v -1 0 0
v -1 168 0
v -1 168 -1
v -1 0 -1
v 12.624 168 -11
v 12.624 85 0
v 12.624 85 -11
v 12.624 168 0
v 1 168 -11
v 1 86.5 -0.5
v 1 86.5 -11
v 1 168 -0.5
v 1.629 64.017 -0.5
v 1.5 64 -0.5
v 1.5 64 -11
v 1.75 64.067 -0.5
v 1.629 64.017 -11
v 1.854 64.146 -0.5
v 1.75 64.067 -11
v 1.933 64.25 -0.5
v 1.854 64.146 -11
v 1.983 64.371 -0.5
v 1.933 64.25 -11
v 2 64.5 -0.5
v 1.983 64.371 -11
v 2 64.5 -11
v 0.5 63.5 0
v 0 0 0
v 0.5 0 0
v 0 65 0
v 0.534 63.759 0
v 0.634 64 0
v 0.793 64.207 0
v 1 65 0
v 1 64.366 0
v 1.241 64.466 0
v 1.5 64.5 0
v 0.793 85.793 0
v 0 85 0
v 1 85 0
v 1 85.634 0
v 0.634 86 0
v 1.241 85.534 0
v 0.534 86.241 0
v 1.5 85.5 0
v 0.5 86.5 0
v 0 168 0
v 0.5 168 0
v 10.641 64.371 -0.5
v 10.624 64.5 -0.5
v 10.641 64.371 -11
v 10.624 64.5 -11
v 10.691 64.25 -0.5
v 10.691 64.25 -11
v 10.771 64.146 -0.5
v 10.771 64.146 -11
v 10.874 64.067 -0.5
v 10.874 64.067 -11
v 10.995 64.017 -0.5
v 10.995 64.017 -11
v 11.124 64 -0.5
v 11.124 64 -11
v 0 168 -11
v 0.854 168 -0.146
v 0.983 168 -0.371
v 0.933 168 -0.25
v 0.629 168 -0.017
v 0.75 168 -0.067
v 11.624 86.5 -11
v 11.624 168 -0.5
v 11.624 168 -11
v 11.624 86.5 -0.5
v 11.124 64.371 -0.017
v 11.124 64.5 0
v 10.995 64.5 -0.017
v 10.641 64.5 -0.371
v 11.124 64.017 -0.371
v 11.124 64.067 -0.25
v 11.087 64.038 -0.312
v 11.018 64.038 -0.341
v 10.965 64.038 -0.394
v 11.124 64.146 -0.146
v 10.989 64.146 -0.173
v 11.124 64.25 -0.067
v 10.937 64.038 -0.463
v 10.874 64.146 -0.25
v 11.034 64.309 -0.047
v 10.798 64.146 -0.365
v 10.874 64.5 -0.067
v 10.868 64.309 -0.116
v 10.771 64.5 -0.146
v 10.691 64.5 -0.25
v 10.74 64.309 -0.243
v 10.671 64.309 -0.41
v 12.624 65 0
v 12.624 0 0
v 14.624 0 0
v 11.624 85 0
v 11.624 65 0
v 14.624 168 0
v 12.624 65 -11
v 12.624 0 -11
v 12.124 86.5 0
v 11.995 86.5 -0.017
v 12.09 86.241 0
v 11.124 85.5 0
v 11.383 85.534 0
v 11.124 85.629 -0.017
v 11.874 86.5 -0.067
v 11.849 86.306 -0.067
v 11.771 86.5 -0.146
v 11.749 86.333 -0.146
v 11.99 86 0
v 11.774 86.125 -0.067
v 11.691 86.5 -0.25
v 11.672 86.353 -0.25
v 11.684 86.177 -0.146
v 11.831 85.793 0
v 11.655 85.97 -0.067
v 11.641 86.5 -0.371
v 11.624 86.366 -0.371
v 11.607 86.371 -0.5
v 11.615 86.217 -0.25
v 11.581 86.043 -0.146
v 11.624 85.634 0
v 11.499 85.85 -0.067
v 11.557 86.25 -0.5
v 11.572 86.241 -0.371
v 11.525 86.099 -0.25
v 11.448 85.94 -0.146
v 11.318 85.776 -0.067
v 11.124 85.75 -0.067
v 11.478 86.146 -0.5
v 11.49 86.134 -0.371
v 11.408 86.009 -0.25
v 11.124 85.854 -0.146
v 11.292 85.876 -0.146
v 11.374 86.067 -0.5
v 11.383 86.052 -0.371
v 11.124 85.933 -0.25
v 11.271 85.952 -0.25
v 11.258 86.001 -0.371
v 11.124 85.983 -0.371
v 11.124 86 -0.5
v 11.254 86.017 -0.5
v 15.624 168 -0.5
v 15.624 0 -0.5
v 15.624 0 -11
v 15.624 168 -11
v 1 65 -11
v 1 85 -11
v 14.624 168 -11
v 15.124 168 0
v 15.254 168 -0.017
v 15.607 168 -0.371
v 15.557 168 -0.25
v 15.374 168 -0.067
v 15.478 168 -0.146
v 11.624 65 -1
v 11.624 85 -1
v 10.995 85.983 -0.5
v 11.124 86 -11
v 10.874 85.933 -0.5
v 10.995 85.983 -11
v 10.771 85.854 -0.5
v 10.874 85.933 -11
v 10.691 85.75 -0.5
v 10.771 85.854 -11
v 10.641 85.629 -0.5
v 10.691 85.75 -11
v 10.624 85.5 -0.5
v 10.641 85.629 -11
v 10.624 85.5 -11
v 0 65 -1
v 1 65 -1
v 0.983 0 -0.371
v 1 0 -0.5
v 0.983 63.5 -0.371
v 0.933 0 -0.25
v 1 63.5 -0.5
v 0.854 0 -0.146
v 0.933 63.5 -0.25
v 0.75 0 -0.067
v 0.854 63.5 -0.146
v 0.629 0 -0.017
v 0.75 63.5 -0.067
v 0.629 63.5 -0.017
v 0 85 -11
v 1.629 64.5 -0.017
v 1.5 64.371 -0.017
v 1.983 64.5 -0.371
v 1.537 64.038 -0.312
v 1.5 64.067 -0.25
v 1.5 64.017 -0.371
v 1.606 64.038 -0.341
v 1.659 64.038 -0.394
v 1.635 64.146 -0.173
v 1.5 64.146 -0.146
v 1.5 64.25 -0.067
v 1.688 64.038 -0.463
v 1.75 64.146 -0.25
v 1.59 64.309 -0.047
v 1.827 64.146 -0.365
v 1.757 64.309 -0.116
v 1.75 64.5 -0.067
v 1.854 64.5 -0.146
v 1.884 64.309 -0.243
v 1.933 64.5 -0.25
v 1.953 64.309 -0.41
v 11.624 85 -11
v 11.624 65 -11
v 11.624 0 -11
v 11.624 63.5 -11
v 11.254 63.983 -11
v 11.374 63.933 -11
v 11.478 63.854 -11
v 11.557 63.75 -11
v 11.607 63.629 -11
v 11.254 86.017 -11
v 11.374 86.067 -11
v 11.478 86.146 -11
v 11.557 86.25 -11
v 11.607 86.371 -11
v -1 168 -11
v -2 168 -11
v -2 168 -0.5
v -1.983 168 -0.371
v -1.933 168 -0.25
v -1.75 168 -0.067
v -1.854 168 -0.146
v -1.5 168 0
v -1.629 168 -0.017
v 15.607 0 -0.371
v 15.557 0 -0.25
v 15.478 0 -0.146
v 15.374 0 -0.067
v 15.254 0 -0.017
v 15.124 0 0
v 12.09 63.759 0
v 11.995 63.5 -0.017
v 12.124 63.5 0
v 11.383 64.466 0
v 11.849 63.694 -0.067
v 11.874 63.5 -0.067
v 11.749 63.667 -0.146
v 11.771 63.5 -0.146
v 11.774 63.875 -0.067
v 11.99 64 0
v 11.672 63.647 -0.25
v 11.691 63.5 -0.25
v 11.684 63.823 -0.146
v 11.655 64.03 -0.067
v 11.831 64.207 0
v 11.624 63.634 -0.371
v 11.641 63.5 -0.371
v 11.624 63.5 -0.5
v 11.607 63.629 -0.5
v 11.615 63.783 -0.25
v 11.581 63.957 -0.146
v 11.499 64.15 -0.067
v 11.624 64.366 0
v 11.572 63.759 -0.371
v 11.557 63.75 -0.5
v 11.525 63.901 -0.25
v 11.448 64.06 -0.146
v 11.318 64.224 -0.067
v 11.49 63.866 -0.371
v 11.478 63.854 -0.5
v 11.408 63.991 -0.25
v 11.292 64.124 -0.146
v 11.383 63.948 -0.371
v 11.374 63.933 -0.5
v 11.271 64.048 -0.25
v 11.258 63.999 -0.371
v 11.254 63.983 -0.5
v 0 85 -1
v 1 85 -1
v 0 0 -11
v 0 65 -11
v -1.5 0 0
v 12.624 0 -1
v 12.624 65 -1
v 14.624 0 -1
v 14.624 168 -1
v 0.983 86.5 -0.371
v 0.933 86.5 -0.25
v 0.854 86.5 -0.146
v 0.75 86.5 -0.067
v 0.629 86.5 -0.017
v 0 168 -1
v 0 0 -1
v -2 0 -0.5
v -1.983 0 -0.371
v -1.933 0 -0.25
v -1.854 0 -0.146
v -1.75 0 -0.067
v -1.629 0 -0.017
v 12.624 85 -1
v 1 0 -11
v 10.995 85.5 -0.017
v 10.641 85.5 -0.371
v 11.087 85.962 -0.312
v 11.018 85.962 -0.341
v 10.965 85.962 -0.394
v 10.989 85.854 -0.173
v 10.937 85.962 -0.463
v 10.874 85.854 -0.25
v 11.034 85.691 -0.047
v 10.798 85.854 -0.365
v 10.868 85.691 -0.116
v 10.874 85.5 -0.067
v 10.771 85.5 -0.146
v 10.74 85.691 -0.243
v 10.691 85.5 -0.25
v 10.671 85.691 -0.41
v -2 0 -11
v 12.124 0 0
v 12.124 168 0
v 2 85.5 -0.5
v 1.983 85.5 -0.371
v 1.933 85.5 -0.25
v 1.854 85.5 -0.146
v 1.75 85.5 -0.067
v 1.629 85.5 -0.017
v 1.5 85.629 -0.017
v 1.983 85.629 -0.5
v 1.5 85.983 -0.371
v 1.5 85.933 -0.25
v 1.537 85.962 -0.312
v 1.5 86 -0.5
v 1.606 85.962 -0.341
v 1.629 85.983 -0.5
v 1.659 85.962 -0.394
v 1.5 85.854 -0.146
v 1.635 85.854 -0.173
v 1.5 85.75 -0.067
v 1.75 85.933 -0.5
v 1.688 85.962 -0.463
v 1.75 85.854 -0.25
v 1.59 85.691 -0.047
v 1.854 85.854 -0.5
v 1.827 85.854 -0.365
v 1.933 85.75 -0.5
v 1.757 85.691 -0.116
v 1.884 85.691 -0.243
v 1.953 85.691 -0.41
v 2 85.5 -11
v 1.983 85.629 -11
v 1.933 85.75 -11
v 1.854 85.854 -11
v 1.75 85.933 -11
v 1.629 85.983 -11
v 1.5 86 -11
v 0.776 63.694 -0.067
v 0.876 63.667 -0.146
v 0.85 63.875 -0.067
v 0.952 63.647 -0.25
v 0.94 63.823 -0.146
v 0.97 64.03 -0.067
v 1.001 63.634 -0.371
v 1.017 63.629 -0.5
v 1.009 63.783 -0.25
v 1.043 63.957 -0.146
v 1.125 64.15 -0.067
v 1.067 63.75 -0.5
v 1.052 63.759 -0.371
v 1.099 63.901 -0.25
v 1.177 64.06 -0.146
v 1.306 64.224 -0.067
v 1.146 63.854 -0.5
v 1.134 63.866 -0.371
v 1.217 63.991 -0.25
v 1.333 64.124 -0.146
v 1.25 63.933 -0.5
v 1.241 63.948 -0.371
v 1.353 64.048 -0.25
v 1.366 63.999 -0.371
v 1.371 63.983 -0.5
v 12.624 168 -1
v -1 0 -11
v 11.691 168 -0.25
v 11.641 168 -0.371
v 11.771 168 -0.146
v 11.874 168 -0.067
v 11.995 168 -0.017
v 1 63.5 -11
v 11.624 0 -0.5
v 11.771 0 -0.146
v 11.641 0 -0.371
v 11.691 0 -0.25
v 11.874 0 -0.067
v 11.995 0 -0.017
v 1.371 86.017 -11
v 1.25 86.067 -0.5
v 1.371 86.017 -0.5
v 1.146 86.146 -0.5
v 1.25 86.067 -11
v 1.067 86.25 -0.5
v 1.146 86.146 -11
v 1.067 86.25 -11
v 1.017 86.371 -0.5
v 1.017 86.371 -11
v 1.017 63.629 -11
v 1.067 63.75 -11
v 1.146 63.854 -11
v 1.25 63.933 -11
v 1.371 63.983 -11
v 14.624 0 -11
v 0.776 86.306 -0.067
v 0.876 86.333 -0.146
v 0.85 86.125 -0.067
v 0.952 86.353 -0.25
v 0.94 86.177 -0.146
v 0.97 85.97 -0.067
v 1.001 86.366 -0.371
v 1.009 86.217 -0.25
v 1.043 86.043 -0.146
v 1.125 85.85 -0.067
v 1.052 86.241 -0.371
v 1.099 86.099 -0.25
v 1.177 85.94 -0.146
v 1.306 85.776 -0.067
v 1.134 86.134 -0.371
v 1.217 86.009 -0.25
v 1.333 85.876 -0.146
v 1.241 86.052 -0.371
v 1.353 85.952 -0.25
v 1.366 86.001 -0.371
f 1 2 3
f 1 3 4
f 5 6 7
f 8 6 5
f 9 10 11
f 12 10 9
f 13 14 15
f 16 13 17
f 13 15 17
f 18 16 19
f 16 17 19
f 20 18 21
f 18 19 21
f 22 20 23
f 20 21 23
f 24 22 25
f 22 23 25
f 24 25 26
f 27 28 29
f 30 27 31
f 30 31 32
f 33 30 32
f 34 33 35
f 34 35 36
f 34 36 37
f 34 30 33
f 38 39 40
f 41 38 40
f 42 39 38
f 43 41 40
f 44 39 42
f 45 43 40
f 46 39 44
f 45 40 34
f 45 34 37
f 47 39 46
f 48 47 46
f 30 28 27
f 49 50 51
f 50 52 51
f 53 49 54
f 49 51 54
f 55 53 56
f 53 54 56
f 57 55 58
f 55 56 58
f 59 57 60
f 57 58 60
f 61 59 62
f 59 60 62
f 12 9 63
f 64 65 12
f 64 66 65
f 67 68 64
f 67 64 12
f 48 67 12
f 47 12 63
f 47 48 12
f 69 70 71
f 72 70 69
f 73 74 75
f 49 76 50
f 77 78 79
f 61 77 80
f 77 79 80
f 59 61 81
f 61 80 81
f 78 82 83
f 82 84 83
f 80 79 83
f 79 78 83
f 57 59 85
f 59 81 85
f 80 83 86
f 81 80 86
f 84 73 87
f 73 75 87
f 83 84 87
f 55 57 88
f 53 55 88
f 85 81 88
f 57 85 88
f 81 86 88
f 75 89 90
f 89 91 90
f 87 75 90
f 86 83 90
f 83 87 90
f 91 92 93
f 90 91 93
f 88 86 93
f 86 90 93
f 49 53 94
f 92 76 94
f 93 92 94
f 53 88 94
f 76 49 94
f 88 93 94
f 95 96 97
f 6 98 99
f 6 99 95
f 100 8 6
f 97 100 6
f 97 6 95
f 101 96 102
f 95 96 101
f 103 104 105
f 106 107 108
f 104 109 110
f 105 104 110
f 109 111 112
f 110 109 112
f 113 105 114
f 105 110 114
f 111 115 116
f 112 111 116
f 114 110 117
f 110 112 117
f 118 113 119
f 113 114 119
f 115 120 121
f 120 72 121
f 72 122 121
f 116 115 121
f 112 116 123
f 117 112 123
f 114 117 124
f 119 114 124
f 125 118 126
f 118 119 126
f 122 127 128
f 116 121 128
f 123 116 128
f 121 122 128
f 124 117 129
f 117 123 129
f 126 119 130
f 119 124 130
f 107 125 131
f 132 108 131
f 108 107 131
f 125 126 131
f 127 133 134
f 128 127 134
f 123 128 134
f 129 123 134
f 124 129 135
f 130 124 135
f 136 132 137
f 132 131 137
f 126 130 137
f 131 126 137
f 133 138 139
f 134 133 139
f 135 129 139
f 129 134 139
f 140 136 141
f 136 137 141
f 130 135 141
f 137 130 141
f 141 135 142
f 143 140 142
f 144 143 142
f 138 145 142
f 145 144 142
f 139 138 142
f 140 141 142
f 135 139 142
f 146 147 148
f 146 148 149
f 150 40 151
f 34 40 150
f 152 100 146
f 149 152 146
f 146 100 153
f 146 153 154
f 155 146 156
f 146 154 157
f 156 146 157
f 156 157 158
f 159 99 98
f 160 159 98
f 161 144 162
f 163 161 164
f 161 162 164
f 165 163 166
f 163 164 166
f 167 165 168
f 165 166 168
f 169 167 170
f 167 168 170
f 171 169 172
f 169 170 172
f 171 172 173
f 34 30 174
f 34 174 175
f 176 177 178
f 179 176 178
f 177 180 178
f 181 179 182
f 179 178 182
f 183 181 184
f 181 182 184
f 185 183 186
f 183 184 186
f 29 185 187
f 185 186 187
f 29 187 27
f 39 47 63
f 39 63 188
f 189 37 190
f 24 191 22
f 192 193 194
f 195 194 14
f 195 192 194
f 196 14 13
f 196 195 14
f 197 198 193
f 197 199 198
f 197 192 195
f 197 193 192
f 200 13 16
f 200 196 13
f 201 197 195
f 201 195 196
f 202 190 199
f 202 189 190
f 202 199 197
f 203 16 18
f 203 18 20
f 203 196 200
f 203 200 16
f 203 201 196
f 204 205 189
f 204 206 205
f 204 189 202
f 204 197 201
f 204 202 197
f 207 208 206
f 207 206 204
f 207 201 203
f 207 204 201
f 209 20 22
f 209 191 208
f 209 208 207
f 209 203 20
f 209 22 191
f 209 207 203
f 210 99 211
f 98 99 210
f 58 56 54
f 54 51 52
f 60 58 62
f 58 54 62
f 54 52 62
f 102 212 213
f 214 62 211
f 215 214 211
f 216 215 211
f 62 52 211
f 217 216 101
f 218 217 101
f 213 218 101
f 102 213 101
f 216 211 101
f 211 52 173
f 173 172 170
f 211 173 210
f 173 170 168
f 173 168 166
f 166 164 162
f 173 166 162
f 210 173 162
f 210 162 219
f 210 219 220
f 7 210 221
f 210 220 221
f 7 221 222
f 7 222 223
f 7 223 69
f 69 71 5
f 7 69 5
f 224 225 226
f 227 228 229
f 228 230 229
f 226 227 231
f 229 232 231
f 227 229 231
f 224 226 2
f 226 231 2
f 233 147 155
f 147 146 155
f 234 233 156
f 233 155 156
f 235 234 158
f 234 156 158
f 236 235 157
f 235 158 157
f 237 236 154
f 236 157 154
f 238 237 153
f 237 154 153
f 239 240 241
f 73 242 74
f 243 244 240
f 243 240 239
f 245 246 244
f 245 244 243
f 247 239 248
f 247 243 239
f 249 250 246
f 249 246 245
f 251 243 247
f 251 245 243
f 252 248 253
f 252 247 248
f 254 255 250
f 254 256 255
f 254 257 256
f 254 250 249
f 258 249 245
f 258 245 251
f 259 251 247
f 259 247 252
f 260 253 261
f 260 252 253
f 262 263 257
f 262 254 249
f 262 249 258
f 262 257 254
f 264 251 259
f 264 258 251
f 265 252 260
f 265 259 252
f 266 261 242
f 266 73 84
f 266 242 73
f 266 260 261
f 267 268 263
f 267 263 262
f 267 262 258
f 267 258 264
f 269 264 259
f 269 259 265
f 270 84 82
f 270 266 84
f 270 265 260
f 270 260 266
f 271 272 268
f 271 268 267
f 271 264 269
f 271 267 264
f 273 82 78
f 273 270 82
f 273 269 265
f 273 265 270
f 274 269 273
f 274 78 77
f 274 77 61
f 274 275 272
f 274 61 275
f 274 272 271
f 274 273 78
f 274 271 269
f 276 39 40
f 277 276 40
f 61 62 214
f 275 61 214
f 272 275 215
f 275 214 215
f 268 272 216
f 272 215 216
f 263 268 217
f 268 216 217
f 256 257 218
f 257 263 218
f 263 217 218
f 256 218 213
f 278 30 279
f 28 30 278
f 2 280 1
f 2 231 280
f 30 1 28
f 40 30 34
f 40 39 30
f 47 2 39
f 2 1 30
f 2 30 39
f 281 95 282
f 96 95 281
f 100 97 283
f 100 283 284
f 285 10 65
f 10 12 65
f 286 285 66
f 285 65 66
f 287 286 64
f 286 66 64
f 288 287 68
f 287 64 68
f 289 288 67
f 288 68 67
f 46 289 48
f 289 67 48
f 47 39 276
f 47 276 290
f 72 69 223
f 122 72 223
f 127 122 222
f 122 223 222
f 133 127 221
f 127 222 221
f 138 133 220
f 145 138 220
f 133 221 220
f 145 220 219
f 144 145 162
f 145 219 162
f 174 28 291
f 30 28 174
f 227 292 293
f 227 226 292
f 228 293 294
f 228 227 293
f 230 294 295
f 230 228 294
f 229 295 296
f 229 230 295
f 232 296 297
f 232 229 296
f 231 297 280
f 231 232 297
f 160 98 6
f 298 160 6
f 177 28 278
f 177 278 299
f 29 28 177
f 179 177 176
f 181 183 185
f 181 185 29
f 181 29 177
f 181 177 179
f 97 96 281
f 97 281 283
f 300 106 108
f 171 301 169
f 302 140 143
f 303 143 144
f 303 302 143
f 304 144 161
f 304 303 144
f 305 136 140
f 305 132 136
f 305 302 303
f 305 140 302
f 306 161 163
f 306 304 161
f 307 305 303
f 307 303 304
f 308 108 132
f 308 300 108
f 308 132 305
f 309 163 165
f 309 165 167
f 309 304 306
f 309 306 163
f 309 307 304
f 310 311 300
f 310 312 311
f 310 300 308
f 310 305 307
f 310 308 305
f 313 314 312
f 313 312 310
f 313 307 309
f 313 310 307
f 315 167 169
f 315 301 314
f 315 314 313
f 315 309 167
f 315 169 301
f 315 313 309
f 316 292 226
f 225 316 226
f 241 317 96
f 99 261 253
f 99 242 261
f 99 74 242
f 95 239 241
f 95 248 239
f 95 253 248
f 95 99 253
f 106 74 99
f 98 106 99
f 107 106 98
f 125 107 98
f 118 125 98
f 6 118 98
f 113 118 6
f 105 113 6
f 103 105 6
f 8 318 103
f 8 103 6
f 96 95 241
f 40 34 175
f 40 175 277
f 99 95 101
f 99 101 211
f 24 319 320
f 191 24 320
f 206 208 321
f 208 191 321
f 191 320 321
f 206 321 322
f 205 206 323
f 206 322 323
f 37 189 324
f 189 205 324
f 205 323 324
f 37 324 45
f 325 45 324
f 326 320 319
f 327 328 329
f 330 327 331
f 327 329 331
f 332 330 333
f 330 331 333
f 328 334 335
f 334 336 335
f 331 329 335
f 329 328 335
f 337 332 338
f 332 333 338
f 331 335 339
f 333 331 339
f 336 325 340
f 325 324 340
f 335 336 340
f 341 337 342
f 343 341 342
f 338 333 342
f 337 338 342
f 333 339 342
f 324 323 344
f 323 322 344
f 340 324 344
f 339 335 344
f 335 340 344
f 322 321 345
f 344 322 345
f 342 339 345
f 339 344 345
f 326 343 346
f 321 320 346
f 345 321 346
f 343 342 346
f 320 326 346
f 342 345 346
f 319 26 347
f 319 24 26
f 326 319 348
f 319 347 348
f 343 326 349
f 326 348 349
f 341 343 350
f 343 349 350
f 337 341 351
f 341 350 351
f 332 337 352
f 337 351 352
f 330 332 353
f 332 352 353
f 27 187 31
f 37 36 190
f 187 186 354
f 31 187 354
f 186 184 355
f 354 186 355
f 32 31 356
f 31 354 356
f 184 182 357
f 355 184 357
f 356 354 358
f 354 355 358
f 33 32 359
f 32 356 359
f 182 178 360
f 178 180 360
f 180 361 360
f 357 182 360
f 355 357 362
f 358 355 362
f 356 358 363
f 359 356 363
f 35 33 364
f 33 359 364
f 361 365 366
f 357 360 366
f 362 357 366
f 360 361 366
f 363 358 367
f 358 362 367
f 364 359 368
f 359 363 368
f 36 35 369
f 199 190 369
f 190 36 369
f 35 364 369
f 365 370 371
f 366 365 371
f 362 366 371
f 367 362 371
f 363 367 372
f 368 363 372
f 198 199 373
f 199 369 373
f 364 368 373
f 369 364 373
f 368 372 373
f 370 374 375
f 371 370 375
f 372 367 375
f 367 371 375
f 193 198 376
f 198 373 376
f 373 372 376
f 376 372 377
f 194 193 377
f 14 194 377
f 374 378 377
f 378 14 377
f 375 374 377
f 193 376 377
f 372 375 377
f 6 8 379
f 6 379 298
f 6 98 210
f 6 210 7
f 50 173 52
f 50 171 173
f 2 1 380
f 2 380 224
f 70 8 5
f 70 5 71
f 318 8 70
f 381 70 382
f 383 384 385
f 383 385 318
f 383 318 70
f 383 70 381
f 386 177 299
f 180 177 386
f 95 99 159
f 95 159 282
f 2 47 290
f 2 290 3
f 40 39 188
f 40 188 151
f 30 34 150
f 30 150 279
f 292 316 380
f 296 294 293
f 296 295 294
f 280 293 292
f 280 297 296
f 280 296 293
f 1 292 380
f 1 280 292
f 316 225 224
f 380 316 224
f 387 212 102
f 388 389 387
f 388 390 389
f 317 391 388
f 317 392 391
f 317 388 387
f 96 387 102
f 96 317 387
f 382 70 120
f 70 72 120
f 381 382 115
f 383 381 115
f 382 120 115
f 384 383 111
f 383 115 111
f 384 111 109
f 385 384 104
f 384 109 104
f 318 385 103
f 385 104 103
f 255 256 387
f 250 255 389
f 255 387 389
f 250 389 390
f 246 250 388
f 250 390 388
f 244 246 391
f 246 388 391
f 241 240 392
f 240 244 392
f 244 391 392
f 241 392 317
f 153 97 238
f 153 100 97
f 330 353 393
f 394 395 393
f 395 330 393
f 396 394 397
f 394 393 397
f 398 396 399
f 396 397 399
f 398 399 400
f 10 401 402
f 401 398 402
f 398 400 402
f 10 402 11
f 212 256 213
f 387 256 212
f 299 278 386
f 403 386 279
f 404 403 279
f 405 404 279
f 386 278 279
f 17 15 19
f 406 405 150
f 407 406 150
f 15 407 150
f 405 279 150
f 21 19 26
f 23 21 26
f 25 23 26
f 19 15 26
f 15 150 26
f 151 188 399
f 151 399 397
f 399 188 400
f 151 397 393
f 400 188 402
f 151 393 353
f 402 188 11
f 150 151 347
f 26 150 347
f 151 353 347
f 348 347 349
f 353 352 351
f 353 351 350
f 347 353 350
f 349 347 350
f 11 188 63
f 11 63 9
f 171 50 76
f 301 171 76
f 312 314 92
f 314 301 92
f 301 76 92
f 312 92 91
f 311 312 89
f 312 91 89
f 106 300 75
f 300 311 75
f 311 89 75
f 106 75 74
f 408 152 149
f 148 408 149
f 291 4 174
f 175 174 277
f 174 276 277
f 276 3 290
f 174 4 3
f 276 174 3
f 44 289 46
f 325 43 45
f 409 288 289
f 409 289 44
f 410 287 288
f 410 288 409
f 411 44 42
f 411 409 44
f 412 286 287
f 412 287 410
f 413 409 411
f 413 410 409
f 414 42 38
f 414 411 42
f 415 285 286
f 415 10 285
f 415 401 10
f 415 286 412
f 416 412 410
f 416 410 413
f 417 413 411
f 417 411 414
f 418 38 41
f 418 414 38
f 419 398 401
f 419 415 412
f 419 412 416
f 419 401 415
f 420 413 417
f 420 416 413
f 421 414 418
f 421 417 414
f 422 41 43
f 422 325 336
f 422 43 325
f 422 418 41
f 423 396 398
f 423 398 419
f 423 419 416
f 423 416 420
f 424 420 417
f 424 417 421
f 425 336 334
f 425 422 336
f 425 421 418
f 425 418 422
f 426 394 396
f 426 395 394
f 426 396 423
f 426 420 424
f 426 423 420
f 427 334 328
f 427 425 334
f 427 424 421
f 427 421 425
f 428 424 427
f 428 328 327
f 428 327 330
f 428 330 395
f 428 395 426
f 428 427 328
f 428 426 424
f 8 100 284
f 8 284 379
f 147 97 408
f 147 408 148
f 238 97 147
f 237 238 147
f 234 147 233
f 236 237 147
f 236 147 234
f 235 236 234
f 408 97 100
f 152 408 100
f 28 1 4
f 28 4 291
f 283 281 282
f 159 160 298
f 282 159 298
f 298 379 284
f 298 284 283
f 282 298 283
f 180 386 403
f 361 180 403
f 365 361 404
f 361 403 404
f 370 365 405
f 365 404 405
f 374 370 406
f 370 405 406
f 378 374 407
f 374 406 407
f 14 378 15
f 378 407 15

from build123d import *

# Parameters (mm, degrees)
F0_W     = 1
F0_H     = 20
F1_DEPTH = 1
F0_H_2   = 168
F2_DEPTH = 11
F3_R     = 0.49999
F3_2_R   = 0.49999
F3_3_R   = 0.49999
F3_4_R   = 0.49999


# Not quite as in the source:
# - a fillet or chamfer is up to 0.001 mm smaller than in the source, because OpenCascade refuses the exact size


with BuildPart() as f1:
    # F0 (on Top) → F1 (new body)
    with BuildSketch(Plane.XY):
        Polygon((-1, 0), (0, 0), (0, 65), (0, 85), (0, 168), (-1, 168), align=None)
        with Locations((0.5, 75)):
            Rectangle(F0_W, F0_H)
    extrude(amount=-F1_DEPTH)


with BuildPart() as f1b:
    # F0 (on Top) → F1, piece 2 (new body)
    with BuildSketch(Plane.XY):
        Polygon((12.6243081391, 65), (12.6243081391, 0), (14.6243081391, 0), (14.6243081391, 168), (12.6243081391, 168), (12.6243081391, 85), align=None)
        with Locations((12.1243081391, 75)):
            Rectangle(F0_W, F0_H)
    extrude(amount=-F1_DEPTH)


with BuildPart() as f2:
    # F0 (on Top) → F2 (new body)
    with BuildSketch(Plane.XY):
        with Locations((-1.5, 84)):
            Rectangle(F0_W, F0_H_2)
    extrude(amount=-F2_DEPTH)

    # F3#4 (radius 0.5 in the source; OpenCascade refuses exactly that, so slightly less here)
    f3_4_edges = [f2.edges().sort_by_distance(p)[0] for p in [
        (-2, 84, 0),
    ]]
    fillet(f3_4_edges, radius=F3_4_R)


with BuildPart() as f2b:
    # F0 (on Top) → F2, piece 2 (new body)
    with BuildSketch(Plane.XY):
        Polygon((0, 168), (0, 85), (1, 85), (1, 86), (1, 168), align=None)
        Polygon((1, 85), (1, 65), (1, 64), (2, 64), (2, 86), (1, 86), align=None)
        Polygon((0, 65), (0, 0), (1, 0), (1, 64), (1, 65), align=None)
    extrude(amount=-F2_DEPTH)

    # F3#3 (radius 0.5 in the source; OpenCascade refuses exactly that, so slightly less here)
    f3_3_edges = [f2b.edges().sort_by_distance(p)[0] for p in [
        (1, 32, 0),
        (2, 75, 0),
        (1, 127, 0),
        (1.5, 86, 0),
        (1.5, 64, 0),
        (2, 64, -5.5),
        (2, 86, -5.5),
        (1, 86, -5.5),
        (1, 64, -5.5),
    ]]
    fillet(f3_3_edges, radius=F3_3_R)


with BuildPart() as f2c:
    # F0 (on Top) → F2, piece 3 (new body)
    with BuildSketch(Plane.XY):
        Polygon((11.6243081391, 64), (11.6243081391, 65), (11.6243081391, 85), (11.6243081391, 86), (10.6243081391, 86), (10.6243081391, 64), align=None)
        Polygon((11.6243081391, 0), (12.6243081391, 0), (12.6243081391, 65), (11.6243081391, 65), (11.6243081391, 64), align=None)
        Polygon((11.6243081391, 85), (12.6243081391, 85), (12.6243081391, 168), (11.6243081391, 168), (11.6243081391, 86), align=None)
    extrude(amount=-F2_DEPTH)

    # F3#2 (radius 0.5 in the source; OpenCascade refuses exactly that, so slightly less here)
    f3_2_edges = [f2c.edges().sort_by_distance(p)[0] for p in [
        (11.624308, 32, 0),
        (10.624308, 75, 0),
        (11.624308, 127, 0),
        (11.124308, 86, 0),
        (11.124308, 64, 0),
        (10.624308, 64, -5.5),
        (10.624308, 86, -5.5),
        (11.624308, 86, -5.5),
        (11.624308, 64, -5.5),
    ]]
    fillet(f3_2_edges, radius=F3_2_R)


with BuildPart() as f2d:
    # F0 (on Top) → F2, piece 4 (new body)
    with BuildSketch(Plane.XY):
        with Locations((15.1243081391, 84)):
            Rectangle(F0_W, F0_H_2)
    extrude(amount=-F2_DEPTH)

    # F3 (radius 0.5 in the source; OpenCascade refuses exactly that, so slightly less here)
    f3_edges = [f2d.edges().sort_by_distance(p)[0] for p in [
        (15.624308, 84, 0),
    ]]
    fillet(f3_edges, radius=F3_R)


solid = Compound([f1.part, f1b.part, f2.part, f2b.part, f2c.part, f2d.part])
